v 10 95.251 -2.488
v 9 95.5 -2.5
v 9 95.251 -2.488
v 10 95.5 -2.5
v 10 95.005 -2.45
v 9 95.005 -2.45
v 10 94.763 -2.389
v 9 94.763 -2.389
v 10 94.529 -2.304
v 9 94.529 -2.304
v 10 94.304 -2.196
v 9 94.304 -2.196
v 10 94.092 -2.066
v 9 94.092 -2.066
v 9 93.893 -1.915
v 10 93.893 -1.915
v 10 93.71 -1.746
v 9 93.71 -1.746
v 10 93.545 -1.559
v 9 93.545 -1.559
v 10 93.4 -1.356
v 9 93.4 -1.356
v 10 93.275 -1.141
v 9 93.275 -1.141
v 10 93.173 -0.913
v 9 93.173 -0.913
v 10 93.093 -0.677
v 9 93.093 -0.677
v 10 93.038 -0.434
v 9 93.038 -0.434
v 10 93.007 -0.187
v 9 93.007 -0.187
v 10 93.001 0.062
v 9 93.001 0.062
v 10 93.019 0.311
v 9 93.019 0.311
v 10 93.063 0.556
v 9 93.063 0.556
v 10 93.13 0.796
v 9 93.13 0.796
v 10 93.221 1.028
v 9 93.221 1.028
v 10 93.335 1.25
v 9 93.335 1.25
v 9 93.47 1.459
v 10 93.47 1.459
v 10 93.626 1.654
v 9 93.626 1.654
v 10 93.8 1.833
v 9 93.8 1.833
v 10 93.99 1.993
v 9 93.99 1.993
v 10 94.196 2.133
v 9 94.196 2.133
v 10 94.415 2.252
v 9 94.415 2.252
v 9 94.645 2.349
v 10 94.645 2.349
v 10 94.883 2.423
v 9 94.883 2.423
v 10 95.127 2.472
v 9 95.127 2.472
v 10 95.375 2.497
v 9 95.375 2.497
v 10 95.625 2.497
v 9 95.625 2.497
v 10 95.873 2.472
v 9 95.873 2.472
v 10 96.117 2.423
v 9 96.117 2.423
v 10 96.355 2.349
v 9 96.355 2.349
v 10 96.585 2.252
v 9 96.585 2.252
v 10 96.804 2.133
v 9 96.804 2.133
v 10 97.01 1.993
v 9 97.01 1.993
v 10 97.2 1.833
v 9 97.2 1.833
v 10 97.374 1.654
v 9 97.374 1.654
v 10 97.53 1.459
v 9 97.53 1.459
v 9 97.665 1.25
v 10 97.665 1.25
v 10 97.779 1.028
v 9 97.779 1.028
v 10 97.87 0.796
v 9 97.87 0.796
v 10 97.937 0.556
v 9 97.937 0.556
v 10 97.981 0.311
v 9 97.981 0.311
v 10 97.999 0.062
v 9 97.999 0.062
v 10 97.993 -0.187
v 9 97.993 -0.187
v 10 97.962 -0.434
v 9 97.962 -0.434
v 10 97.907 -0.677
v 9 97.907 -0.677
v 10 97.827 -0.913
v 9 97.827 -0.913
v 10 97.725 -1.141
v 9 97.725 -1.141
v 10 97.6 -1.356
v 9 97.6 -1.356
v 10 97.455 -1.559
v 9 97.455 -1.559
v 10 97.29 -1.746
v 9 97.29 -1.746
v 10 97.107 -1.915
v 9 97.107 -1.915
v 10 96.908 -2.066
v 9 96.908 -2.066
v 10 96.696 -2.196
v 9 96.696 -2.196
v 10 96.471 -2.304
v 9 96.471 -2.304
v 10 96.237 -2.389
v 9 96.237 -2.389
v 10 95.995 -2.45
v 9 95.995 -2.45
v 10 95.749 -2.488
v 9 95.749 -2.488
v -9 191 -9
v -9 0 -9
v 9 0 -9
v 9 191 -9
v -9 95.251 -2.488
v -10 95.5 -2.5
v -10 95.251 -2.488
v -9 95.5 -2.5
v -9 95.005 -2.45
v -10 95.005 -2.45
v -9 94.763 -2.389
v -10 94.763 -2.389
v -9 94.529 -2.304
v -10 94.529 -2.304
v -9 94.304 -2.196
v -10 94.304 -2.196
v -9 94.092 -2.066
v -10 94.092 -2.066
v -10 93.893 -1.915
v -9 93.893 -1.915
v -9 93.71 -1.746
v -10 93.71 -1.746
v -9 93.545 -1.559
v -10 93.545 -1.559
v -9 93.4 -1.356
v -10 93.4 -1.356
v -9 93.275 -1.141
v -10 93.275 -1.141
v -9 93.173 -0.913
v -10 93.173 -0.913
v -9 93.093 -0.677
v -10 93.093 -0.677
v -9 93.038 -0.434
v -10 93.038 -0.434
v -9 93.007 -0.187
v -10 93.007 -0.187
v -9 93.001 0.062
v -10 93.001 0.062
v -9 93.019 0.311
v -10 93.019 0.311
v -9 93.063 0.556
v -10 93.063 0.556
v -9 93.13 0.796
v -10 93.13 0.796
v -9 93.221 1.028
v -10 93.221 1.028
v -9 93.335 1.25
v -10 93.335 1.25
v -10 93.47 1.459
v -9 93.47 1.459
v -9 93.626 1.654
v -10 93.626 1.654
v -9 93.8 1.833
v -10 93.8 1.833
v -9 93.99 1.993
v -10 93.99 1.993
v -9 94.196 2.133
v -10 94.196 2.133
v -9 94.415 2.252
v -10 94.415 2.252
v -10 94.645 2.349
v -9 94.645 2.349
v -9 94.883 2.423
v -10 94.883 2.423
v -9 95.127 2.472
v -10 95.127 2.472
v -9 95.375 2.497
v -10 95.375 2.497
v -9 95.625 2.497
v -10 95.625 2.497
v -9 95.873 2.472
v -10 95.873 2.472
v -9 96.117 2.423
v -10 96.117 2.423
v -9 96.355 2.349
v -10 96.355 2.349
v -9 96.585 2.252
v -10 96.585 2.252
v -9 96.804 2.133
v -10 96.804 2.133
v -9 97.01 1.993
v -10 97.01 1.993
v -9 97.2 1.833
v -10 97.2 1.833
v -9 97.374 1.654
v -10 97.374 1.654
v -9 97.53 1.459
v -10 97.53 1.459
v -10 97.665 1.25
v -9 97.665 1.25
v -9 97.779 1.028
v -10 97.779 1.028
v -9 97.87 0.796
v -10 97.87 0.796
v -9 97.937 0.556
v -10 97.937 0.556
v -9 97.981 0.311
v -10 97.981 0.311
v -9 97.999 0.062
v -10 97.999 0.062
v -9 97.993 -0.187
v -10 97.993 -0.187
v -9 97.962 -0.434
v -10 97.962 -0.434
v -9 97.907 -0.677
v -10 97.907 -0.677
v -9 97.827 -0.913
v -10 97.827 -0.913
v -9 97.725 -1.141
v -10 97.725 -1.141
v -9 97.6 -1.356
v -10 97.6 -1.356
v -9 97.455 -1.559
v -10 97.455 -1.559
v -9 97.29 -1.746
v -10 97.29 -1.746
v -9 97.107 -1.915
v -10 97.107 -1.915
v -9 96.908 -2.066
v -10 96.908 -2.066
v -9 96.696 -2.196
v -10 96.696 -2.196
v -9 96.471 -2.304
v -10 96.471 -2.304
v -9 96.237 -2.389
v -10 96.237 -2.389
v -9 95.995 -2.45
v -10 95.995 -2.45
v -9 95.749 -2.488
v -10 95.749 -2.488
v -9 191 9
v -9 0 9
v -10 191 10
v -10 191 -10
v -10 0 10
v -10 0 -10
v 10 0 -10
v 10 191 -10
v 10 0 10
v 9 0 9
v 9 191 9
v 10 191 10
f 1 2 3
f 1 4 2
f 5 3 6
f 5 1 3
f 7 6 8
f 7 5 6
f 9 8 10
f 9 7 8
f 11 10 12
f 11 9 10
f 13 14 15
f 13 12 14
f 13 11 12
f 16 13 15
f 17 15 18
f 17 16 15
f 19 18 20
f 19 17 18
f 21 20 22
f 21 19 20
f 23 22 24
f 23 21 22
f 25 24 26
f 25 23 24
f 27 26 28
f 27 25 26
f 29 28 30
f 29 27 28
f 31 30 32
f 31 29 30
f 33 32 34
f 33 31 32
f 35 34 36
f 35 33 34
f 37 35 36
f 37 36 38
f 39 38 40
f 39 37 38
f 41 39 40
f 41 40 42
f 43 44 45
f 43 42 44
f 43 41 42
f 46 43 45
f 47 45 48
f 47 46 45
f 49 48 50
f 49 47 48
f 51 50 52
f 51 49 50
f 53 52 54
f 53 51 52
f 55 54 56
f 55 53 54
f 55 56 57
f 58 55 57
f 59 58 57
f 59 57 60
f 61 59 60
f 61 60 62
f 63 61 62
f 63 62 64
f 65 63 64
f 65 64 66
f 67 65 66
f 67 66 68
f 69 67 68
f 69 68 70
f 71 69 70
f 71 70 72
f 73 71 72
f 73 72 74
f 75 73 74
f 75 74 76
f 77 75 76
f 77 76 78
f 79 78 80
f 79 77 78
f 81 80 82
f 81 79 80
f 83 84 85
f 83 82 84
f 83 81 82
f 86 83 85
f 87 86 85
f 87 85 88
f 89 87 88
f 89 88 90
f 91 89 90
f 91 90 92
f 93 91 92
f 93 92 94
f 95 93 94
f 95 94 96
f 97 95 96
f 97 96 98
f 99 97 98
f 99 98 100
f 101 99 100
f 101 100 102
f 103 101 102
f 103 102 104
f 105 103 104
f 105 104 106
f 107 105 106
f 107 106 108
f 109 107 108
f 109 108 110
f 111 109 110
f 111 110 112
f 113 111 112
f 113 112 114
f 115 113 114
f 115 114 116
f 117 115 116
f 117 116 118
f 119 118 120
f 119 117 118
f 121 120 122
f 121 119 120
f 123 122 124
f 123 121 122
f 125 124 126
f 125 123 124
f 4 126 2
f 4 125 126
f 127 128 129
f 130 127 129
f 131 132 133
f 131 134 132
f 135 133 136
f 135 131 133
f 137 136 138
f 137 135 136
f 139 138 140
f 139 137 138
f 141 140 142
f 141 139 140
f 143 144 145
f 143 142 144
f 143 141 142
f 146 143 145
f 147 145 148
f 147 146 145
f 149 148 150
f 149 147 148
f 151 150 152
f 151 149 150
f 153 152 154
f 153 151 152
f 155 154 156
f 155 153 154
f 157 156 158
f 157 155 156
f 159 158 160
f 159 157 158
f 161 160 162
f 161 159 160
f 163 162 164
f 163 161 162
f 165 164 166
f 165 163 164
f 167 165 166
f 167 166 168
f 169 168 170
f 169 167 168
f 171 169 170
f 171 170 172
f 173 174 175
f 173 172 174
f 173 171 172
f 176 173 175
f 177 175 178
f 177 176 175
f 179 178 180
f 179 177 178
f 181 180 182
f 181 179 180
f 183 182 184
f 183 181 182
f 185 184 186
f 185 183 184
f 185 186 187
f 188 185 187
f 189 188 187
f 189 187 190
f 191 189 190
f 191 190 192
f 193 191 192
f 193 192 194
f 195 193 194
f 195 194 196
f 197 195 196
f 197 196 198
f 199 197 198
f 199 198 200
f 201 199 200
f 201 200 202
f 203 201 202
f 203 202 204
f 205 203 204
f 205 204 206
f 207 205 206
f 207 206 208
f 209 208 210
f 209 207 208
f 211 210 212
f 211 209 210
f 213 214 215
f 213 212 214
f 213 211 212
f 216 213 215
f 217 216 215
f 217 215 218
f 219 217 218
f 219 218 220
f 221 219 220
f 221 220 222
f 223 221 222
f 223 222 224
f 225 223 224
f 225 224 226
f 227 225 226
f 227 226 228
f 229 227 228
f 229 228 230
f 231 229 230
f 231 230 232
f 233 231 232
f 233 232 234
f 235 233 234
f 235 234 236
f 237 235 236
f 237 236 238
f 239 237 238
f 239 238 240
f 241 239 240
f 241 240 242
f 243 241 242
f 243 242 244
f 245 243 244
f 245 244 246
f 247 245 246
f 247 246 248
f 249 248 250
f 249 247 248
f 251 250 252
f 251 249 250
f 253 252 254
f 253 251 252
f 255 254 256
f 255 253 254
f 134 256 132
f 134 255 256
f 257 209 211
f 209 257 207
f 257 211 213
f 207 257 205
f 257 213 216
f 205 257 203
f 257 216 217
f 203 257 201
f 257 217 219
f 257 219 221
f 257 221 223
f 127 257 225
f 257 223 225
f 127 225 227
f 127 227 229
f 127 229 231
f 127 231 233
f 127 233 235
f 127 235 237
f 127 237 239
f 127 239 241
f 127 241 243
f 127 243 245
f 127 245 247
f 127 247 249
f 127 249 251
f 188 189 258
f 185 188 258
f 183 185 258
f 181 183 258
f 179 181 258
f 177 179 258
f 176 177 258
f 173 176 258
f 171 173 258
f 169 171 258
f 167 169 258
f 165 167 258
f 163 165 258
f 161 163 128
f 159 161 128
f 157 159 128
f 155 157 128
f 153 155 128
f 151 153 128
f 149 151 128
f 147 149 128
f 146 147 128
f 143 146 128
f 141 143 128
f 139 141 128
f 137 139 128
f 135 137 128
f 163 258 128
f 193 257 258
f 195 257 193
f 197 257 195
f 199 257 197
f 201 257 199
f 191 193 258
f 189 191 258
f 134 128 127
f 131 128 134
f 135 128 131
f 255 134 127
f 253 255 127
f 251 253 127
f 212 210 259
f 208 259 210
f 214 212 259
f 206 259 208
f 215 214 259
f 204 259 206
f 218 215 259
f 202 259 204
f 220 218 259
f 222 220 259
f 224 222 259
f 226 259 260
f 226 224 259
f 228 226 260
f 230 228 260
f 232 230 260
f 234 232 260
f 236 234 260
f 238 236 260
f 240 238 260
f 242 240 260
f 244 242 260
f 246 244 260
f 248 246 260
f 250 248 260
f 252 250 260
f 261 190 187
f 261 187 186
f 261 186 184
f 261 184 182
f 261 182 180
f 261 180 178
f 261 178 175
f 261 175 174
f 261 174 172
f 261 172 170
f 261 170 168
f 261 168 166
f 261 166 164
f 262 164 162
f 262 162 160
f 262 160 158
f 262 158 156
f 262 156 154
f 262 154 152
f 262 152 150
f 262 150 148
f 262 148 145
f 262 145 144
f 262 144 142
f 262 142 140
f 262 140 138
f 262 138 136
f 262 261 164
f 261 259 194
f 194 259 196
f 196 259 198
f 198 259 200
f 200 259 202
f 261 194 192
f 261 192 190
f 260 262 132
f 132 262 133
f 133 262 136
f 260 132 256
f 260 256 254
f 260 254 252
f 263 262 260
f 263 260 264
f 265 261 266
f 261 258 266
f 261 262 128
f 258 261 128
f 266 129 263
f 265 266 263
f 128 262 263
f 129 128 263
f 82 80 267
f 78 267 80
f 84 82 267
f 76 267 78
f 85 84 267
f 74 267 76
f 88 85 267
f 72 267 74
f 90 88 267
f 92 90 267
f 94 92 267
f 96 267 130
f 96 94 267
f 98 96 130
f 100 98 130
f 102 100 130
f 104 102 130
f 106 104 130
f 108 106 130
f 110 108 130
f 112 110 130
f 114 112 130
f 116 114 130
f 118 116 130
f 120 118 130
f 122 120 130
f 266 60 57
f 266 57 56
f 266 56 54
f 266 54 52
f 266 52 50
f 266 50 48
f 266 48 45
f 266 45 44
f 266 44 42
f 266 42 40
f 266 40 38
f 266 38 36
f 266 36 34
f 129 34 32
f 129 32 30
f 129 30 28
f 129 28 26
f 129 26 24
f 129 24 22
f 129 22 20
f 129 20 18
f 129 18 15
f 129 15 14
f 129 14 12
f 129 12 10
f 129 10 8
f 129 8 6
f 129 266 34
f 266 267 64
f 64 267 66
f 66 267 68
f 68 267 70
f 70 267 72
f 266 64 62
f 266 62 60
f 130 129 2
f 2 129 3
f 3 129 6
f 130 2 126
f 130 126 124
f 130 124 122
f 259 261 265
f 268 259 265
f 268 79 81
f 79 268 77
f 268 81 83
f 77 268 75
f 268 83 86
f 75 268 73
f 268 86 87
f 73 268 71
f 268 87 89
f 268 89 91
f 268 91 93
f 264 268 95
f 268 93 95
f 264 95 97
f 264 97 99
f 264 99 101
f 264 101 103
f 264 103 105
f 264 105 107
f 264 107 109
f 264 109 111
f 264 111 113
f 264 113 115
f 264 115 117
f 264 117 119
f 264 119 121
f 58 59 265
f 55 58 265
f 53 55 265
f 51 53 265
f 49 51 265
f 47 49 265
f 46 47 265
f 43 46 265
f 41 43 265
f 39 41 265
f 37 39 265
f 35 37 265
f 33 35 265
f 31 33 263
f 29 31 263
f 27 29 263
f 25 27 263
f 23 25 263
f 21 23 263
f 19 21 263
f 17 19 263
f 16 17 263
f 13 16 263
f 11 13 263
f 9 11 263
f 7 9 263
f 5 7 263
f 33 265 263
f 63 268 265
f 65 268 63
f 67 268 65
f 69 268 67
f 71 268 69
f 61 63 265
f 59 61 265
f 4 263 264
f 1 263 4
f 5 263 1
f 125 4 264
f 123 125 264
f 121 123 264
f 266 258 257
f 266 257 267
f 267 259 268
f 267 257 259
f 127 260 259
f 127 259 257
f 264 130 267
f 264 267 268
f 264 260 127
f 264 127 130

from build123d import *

# Parameters (mm, degrees)
SKETCH1_W               = 20
SKETCH1_H               = 20
SKETCH1_W_2             = 18
SKETCH1_H_2             = 18
BOSS_EXTRUDE1_DEPTH     = 191
CUT_EXTRUDE1_DEPTH      = 193.304446126
CUT_EXTRUDE1_DEPTH_BACK = 193.304446126
SKETCH2_R               = 2.5


with BuildPart() as part:
    # Sketch1 → Boss-Extrude1 (new body)
    with BuildSketch(Plane(origin=(0, 0, 0), x_dir=(1, 0, 0), z_dir=(0, 1, 0))):
        Rectangle(SKETCH1_W, SKETCH1_H)
        Rectangle(SKETCH1_W_2, SKETCH1_H_2, mode=Mode.SUBTRACT)
    extrude(amount=BOSS_EXTRUDE1_DEPTH)

    # Sketch2 → Cut-Extrude1 (cut, two sides: drawn at the far end of the back side and taken through both)
    with BuildSketch(Plane.ZY.offset(10).offset(-CUT_EXTRUDE1_DEPTH_BACK)):
        with Locations(Location((0, 95.5, 0), (0, 0, 180))):
            Circle(SKETCH2_R)
    extrude(amount=CUT_EXTRUDE1_DEPTH + CUT_EXTRUDE1_DEPTH_BACK, mode=Mode.SUBTRACT)


solid = part.part
